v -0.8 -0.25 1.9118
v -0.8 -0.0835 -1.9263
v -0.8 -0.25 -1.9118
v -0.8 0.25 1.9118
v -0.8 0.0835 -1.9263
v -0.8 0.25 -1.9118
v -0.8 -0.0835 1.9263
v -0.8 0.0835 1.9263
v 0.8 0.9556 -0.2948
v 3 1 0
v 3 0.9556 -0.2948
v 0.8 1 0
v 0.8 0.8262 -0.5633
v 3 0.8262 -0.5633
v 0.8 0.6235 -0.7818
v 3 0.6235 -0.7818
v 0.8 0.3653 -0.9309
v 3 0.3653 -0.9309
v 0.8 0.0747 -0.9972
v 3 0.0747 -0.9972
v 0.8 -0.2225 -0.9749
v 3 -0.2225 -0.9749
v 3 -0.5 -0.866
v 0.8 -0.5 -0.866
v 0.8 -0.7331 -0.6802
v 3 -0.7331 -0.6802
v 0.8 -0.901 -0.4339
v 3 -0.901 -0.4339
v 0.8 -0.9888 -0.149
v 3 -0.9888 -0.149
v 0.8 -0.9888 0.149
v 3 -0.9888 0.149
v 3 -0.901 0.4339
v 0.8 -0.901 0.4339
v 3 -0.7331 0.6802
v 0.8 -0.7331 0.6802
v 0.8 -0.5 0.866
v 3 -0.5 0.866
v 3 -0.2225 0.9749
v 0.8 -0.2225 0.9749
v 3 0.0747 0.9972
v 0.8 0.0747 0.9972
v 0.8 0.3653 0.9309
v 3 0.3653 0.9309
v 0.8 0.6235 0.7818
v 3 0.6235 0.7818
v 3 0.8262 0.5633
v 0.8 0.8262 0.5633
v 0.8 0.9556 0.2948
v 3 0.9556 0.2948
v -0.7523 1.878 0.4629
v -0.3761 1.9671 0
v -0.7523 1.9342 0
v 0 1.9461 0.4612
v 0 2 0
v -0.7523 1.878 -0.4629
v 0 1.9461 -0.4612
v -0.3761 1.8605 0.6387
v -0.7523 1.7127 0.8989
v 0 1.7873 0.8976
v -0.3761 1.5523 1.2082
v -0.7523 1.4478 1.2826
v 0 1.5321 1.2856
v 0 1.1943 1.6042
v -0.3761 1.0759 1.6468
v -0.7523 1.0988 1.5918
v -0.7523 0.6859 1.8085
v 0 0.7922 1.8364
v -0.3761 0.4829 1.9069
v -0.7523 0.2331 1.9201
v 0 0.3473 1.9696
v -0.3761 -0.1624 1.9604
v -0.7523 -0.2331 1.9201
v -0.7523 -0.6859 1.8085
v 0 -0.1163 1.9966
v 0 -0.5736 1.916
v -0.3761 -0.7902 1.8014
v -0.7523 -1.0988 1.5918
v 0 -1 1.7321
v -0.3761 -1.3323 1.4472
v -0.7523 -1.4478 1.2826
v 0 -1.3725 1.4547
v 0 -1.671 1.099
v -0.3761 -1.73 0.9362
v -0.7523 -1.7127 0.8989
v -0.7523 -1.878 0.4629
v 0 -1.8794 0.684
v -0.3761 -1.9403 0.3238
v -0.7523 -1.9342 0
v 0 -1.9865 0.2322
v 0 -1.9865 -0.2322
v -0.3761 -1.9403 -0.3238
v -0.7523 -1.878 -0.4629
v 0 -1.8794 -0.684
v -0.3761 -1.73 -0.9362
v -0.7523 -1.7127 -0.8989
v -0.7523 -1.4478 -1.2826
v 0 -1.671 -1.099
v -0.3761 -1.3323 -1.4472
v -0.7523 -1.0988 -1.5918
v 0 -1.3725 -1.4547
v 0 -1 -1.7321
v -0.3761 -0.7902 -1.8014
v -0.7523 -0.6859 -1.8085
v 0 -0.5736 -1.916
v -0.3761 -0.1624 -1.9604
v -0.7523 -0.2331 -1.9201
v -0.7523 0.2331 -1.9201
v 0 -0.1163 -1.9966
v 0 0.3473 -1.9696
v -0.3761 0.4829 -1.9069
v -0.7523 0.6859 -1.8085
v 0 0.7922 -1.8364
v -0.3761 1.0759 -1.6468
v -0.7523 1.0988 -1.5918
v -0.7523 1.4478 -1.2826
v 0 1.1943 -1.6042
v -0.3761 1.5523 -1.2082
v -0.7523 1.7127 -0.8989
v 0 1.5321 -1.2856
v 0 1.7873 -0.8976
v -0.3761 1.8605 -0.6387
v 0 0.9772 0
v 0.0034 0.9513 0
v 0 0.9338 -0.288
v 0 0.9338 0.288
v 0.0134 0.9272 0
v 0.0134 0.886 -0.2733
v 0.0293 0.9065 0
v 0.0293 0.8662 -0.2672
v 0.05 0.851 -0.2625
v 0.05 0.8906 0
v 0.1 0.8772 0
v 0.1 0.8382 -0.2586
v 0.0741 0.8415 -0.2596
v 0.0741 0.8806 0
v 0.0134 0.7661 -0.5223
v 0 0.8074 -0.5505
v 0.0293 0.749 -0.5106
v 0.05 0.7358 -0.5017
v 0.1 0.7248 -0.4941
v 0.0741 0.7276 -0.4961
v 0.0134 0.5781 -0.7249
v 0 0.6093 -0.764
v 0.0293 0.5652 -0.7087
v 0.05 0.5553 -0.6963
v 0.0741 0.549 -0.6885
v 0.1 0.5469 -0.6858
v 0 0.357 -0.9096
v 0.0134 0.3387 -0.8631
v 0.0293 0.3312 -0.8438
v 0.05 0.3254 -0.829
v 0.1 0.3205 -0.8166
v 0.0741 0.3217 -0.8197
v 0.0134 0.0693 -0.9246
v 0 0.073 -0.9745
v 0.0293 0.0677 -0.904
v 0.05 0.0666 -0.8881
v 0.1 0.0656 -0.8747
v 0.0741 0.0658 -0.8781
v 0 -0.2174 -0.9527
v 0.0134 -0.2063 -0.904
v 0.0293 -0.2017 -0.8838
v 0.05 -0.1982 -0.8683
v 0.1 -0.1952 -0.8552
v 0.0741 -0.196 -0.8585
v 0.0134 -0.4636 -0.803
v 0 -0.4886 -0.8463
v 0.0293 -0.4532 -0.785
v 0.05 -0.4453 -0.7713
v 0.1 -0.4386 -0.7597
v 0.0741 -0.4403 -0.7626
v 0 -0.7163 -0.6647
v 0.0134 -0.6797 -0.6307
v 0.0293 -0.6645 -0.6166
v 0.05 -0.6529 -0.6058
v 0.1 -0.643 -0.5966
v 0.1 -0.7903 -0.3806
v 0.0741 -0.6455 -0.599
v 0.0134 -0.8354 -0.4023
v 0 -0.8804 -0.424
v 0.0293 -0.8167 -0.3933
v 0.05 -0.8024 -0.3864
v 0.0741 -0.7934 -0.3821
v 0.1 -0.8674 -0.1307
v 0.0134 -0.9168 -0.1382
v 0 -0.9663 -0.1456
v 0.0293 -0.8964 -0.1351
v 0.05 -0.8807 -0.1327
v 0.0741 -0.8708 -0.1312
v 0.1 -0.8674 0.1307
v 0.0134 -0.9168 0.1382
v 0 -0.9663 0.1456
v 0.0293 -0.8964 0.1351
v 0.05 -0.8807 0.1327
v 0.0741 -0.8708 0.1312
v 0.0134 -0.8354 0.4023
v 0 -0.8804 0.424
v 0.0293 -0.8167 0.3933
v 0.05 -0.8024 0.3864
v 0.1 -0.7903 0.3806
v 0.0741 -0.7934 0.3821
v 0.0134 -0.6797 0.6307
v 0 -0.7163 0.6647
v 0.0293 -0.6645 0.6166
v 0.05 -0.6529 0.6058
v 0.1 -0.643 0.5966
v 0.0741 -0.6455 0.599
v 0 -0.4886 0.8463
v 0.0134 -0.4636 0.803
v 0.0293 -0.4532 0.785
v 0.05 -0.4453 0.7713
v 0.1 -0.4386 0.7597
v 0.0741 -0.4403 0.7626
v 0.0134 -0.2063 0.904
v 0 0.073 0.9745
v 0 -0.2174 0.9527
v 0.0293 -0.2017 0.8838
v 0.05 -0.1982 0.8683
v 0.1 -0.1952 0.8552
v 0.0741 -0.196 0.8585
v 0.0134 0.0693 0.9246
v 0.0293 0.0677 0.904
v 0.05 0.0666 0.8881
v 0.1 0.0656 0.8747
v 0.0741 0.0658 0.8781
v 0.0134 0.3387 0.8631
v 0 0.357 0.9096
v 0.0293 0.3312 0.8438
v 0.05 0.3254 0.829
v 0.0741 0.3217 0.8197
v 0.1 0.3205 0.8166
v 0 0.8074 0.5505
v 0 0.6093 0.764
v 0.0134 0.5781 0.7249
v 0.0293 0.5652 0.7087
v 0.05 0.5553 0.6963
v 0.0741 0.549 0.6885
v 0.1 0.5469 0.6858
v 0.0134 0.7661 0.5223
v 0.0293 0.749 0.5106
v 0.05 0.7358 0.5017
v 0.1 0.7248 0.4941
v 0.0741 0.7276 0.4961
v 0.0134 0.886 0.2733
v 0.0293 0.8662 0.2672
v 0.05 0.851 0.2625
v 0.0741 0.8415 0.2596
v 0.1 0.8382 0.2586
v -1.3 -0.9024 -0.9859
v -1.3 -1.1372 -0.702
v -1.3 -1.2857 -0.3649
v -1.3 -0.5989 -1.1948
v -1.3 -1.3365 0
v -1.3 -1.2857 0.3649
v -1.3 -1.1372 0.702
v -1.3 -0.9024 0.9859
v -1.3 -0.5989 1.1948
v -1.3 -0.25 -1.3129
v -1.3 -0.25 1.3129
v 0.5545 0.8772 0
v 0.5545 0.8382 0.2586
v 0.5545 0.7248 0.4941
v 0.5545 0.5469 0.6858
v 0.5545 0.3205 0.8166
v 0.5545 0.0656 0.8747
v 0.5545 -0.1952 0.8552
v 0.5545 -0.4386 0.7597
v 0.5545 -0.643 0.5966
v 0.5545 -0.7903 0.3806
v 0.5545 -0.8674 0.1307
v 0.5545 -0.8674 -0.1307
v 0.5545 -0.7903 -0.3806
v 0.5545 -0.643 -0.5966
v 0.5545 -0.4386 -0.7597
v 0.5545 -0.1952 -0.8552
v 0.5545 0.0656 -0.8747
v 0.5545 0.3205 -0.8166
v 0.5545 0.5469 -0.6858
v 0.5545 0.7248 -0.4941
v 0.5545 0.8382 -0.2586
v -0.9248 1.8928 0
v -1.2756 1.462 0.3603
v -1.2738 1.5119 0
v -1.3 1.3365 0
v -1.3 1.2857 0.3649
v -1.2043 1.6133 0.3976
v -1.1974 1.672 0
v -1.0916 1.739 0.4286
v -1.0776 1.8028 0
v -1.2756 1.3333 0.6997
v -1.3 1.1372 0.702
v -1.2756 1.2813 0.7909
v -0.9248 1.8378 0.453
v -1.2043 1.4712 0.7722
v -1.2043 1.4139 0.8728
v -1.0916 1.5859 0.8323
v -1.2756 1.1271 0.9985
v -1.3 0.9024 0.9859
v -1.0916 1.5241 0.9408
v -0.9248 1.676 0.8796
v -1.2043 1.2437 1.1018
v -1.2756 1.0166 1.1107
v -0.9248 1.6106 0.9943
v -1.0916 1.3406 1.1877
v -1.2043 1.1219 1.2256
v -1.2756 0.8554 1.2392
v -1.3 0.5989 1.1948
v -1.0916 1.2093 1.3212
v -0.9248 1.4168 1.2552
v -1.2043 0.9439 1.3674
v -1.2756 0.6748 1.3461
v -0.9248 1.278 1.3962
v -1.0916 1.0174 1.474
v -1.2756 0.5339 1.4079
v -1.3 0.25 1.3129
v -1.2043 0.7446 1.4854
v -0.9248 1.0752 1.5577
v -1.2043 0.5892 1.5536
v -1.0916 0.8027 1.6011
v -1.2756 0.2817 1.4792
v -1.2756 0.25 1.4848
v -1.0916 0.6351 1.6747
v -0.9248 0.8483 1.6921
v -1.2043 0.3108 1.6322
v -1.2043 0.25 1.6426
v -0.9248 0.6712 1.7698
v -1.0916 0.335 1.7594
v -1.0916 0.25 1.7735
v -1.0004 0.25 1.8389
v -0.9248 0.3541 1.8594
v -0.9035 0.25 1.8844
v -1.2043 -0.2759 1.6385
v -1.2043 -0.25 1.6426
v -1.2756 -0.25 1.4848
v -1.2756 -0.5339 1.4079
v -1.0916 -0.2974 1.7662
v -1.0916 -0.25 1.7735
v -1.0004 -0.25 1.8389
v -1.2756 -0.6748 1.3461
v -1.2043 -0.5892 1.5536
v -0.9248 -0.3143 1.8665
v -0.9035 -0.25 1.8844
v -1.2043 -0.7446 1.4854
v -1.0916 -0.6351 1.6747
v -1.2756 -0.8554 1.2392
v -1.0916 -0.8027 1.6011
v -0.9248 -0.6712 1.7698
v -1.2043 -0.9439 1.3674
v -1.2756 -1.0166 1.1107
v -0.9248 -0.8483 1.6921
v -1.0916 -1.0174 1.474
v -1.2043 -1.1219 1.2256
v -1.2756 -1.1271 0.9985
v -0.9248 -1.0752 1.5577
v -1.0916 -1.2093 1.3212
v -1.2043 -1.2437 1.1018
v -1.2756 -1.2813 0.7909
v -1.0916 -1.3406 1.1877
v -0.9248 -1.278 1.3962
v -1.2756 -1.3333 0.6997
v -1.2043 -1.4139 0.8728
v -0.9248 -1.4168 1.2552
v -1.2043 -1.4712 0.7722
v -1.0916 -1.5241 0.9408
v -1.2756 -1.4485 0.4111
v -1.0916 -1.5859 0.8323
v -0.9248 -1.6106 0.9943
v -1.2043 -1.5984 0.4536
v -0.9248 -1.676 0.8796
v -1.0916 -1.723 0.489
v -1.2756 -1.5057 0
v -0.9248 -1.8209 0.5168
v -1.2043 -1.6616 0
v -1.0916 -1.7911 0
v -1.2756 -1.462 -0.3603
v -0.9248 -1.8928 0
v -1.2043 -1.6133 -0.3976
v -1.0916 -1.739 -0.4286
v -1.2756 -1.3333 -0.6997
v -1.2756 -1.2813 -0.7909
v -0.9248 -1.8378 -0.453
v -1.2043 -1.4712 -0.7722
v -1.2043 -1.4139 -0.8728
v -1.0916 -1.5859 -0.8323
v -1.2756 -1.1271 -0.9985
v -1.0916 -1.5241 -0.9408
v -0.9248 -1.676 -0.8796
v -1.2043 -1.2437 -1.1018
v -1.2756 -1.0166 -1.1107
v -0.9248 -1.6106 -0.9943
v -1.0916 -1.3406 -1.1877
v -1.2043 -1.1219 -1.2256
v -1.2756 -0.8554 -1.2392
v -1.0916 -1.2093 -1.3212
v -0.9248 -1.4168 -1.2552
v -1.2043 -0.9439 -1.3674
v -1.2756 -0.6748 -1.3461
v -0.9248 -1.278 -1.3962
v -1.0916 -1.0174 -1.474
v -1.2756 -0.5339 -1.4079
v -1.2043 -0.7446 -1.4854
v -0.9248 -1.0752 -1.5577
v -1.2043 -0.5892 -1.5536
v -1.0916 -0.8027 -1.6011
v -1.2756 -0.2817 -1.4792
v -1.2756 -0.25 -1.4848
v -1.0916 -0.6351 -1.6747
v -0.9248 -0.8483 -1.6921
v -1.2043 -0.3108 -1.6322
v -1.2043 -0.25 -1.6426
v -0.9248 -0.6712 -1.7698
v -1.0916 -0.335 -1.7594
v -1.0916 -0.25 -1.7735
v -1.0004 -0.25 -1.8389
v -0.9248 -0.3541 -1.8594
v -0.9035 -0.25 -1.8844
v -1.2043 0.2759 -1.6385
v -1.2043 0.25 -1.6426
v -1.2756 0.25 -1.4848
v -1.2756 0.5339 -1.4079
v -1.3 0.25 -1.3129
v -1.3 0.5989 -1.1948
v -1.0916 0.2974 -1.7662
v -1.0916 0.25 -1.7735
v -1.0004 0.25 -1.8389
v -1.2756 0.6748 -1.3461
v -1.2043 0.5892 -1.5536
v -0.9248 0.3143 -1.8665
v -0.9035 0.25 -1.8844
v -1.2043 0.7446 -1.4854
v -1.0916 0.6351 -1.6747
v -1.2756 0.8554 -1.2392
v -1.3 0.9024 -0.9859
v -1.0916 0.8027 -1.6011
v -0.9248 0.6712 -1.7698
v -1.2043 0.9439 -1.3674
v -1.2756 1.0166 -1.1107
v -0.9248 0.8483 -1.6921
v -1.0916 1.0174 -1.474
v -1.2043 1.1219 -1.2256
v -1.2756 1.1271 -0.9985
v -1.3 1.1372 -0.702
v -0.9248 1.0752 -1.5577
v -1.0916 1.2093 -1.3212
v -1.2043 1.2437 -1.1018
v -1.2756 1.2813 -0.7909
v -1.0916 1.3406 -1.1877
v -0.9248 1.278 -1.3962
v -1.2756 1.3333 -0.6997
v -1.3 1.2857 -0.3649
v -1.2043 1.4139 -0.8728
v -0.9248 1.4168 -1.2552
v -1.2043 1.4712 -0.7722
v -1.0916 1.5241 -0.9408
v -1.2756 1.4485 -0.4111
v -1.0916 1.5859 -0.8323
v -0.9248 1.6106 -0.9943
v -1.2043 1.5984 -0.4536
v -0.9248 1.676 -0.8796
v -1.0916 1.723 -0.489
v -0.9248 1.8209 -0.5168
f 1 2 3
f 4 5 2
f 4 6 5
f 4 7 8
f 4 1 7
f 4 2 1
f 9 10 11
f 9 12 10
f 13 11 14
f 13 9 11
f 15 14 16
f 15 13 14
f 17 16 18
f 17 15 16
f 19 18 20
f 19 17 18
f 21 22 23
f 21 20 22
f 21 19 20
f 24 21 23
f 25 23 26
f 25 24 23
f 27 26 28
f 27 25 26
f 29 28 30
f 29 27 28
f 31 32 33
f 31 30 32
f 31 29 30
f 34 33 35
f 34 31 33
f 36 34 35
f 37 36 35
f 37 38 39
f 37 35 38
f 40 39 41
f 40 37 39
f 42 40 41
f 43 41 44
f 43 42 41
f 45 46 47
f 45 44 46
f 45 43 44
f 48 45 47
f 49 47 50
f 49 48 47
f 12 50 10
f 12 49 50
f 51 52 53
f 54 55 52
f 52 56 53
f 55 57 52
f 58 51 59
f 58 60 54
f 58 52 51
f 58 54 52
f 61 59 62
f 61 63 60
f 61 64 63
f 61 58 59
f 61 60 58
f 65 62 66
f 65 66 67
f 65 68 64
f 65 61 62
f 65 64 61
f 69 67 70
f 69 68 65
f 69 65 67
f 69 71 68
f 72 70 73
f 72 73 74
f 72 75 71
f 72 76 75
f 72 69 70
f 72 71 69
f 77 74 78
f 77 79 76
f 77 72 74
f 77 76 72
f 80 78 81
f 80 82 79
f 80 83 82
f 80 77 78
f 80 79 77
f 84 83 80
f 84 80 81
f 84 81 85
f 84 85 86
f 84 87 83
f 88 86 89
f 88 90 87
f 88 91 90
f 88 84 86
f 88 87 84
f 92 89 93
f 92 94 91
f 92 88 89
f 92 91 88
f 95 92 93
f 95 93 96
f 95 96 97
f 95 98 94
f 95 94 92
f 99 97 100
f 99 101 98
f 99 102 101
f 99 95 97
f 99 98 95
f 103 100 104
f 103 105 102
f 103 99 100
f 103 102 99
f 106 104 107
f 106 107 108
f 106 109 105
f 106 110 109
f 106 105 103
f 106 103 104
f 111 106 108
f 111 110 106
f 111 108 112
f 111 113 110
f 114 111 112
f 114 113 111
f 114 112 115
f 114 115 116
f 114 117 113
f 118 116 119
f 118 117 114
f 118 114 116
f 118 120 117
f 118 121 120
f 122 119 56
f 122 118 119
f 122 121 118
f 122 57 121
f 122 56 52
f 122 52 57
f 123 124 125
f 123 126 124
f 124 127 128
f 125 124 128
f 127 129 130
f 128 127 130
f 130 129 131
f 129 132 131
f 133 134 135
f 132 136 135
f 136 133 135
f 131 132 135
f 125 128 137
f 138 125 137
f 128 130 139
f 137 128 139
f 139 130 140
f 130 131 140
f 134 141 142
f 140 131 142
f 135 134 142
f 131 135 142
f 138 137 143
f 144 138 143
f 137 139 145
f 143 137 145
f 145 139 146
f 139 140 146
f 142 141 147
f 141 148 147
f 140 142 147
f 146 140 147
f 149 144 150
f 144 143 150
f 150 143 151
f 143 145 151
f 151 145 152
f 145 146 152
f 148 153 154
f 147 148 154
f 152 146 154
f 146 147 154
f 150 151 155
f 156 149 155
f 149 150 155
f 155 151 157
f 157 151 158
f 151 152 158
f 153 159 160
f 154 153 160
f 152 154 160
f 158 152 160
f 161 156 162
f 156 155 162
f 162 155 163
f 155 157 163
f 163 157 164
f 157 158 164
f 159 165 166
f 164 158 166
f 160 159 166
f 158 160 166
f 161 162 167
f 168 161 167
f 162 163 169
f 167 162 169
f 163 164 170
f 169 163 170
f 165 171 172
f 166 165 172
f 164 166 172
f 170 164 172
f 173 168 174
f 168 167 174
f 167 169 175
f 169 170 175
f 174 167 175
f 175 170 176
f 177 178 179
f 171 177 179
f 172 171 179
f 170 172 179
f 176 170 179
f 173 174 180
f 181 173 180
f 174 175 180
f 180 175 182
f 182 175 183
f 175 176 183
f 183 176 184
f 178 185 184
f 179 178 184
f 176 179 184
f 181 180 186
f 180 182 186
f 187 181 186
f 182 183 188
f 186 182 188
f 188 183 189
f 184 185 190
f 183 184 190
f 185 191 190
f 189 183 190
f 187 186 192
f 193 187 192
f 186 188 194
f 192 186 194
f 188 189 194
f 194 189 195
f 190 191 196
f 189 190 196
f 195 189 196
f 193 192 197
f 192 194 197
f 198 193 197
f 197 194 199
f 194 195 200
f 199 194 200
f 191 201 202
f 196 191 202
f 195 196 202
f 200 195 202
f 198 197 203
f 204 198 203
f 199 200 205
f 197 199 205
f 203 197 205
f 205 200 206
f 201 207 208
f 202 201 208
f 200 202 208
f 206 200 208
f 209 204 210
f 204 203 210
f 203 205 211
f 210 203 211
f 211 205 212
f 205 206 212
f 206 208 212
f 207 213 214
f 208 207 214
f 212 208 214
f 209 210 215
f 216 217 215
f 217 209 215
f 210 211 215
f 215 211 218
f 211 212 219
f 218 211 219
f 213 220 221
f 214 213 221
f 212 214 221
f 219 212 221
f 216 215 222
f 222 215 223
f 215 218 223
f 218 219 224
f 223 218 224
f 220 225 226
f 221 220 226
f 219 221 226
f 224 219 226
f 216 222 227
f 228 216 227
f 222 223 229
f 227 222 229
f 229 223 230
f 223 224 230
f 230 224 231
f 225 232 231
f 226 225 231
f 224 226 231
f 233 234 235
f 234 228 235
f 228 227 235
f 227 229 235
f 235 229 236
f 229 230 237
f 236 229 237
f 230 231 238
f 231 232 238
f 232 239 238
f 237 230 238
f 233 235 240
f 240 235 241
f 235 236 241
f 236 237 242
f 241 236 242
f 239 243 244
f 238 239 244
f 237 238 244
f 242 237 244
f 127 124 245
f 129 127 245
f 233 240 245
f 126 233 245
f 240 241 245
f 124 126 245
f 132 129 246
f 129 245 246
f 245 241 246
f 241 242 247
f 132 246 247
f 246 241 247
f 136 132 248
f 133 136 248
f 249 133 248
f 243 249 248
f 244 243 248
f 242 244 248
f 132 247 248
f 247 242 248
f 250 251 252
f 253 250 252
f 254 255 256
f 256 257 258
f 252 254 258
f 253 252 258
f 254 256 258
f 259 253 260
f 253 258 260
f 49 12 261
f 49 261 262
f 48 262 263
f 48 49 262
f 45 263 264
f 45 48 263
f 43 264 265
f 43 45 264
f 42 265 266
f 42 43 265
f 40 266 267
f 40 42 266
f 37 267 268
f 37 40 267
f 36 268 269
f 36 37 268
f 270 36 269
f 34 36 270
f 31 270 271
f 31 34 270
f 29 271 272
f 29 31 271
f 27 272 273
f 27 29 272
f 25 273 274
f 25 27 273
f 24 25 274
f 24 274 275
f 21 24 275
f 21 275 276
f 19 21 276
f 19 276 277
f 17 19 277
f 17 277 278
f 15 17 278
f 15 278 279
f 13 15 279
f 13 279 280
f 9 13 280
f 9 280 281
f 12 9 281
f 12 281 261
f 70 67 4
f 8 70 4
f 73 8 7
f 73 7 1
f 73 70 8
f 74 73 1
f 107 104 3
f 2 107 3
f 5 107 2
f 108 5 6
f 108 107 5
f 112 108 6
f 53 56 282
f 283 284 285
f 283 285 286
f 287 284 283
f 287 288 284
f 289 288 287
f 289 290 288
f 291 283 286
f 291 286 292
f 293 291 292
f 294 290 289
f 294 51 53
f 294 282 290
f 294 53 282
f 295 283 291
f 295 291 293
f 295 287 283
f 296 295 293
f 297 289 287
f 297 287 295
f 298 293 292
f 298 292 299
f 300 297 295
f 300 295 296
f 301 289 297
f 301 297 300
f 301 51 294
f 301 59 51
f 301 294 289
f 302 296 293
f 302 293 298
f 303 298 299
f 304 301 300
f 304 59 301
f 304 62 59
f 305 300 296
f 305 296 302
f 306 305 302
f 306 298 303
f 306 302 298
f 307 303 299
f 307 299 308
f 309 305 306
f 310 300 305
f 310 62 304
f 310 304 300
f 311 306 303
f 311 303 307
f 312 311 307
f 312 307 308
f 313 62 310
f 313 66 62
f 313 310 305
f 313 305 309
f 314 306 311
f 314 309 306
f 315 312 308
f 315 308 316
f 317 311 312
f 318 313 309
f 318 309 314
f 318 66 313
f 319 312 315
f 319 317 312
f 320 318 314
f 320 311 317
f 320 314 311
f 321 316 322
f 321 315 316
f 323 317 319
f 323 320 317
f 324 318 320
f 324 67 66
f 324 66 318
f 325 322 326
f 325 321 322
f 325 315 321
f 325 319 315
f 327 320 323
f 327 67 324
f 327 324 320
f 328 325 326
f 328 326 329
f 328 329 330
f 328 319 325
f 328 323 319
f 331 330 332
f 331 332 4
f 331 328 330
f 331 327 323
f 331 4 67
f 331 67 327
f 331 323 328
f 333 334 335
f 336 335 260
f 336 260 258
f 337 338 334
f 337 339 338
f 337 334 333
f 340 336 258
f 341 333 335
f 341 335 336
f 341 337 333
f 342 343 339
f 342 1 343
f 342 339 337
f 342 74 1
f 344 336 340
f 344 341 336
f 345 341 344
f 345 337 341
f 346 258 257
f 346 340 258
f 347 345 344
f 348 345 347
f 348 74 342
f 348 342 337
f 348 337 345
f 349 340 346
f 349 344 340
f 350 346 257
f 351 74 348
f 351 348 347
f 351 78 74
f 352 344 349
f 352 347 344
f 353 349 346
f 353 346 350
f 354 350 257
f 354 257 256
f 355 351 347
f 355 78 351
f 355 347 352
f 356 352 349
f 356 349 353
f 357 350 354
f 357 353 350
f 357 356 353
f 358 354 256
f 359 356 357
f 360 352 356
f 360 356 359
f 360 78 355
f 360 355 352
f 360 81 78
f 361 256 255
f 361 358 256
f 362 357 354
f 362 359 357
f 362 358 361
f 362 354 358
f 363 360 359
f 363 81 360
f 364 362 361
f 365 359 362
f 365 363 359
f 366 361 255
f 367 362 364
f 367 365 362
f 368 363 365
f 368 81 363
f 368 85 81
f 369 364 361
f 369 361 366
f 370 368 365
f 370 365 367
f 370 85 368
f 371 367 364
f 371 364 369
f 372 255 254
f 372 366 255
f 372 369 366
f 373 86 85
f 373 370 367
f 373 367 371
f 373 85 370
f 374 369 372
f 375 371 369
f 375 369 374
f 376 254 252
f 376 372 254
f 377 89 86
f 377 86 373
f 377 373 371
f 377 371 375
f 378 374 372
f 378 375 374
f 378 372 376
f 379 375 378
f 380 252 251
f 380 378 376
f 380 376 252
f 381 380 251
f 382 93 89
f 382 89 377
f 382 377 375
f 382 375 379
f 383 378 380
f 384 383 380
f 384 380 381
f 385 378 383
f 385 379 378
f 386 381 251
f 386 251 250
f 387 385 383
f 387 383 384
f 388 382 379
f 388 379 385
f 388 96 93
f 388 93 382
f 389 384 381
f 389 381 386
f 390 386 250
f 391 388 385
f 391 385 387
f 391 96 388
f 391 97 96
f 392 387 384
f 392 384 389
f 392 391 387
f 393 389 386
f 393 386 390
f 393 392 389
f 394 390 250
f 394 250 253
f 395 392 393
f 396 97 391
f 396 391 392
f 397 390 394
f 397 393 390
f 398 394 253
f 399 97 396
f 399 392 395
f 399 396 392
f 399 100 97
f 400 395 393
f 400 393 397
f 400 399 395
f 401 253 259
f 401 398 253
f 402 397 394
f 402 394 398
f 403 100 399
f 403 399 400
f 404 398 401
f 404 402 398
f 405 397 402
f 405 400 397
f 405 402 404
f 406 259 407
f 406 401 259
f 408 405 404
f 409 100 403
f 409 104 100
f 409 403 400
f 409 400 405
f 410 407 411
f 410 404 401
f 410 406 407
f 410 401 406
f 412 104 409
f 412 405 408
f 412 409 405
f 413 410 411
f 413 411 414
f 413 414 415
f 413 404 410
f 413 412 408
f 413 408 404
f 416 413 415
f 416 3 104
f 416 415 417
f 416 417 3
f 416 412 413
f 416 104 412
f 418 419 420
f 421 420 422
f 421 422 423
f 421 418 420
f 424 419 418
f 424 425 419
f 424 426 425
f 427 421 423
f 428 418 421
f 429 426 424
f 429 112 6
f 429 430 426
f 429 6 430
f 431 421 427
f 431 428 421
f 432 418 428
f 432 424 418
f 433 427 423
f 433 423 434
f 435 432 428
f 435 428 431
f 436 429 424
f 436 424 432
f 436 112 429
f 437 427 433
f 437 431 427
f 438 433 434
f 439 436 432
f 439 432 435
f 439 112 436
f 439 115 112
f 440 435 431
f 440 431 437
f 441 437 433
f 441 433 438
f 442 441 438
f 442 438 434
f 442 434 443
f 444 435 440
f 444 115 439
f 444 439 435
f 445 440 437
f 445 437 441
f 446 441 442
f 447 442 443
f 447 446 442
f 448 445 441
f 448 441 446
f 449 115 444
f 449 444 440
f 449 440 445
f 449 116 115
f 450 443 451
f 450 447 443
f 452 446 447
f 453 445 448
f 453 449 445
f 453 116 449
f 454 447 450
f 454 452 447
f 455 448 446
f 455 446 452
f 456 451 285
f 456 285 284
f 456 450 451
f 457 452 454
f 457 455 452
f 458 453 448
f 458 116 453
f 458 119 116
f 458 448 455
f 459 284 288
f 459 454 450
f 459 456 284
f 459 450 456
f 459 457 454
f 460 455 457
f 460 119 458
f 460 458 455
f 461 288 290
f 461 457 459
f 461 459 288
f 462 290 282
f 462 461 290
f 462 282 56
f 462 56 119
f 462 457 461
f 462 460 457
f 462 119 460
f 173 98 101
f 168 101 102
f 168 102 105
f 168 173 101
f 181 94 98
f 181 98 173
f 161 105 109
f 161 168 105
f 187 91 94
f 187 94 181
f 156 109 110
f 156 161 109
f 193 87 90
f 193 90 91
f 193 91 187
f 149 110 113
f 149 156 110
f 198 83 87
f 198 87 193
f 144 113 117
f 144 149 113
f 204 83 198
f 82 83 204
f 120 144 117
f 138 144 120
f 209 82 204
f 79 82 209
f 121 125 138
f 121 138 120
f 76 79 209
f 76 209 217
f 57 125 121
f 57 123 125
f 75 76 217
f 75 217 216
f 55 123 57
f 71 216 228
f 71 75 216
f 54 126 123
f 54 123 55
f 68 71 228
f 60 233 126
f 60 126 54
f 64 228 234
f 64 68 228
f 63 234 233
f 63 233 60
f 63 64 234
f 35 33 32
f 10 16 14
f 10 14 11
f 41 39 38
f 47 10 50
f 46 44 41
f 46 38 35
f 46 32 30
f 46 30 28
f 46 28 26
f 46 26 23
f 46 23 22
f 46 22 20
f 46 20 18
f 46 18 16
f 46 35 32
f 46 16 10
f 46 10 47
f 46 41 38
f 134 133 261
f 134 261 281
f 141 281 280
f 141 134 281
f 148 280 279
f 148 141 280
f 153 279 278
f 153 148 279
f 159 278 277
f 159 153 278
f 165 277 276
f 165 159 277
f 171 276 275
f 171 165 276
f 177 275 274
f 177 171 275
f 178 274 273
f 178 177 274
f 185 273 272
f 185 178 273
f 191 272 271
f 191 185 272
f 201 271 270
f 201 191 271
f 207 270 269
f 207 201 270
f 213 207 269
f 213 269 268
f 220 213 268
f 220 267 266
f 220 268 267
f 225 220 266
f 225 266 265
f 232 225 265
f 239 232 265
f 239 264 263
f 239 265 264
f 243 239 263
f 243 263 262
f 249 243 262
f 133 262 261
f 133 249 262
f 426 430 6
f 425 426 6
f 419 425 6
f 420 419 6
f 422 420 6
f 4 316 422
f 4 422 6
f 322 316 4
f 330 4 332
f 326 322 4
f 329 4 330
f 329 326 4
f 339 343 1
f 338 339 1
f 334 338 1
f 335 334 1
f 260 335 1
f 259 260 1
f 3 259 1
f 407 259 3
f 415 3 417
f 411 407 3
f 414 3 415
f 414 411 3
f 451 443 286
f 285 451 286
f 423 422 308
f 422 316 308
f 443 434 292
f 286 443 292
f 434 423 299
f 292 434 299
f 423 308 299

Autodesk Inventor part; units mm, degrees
ref_plane "YZ Plane" through (0, 0, 0) normal (1, 0, 0) x (0, 1, 0)
ref_plane "XZ Plane" through (0, 0, 0) normal (0, 1, 0) x (-1, 0, 0)
sketch "Skizze1" plane through (0, 0, 0) normal (0, 0, 1) x (1, 0, 0)
  line L0 (-1.3, 0) -> (3, 0)
  line L1 (3, 0) -> (3, 1)
  line L2 (3, 1) -> (0.8, 1)
  line L3 (0.8, 1) -> (0.5545, 0.8772)
  line L4 (0.5545, 0.8772) -> (0, 0.8772)
  line L5 (0, 0.8772) -> (0, 2)
  line L6 (-2.16, 0) -> (3.86, 0) projected
  line L7 (0, -0.4) -> (0, 2.4) projected
  line L8 (-1.3, 0) -> (-1.3, 1.8863)
  line L9 (0, 2) -> (-1.3, 1.8863)
  line L10 (0.8, 1) -> (0, 1) construction
  dimension "d0" = 3
  dimension "d1" = 2.2
  dimension "d2" = 0.2455
  dimension "d3" = 1.3
  dimension "d4" = 2
  dimension "d5" = 1.7545
  dimension "d9" = 4
  dimension "d10" = 5
revolve "Körper" add sketch "Skizze1" angle 360 about axis through (-1.3, 0, 0) along (1, 0, 0)
sketch "Skizze2" plane through (-1.3, 0, 0) normal (-1, 0, 0) x (0, 0, 1)
  circle A0 centre (0, 0) radius 2 projected
  line L0 (0, 0) -> (0, 1.8863) projected
  line L1 (-2, 0.25) -> (2, 0.25)
  line L2 (2, 0.25) -> (2, -0.25)
  line L3 (2, -0.25) -> (-2, -0.25)
  line L4 (-2, -0.25) -> (-2, 0.25)
  line L5 (-2, 0) -> (2, 0) construction
  line L6 (0, 0.25) -> (0, -0.25) construction
  dimension "d11" = 0.5
  dimension "d12" = 4
fillet "Rundung1" radius 0.6 1 edges at (-1.3, -1.8863, 0)
extrude "Loch" cut sketch "Skizze2" against normal blind 0.5 contours A0 L3 L1 | L2 L3 A0 | A0 L1 L2 | A0 L4 L1 | L3 L4 A0
thread "Gewinde" size "M2x0.4" class "6g" standard "ISO Metric profile" length 2.2
ref_plane "Work Plane1" through (30.1625, 0, 0) normal (0, 0, -1) x (1, 0, 0)
fillet "Fillet5" radius 0.1 1 edges at (0, -0.8772, 0)
equation "\"d11\" = SBR"
equation "\"d12\" = KOD"
equation "\"d14\" = RR"
equation "\"d19\" = STI"
equation "\"d15\" = GEL"
equation "\"d41\" = R"
equation "\"d0\" = NLG"
equation "\"d1\" = GEL"
equation "\"d3\" = KOH"
equation "\"d4\" = GD"
equation "\"d5\" = BDM"
equation "\"d9\" = KOD"
equation "\"d10\" = KEWI"
equation "\"GD\" = NND"
equation "\"NLG\" = 3"
equation "\"GEL\" = 2.2"
equation "\"KOD\" = 4"
equation "\"KOH\" = 1.3"
equation "\"GAL\" = 0.61345 * PTC"
equation "\"R\" = 0.1"
equation "\"BDM\" = 1.7545"
equation "\"GUL\" = 0.61345 * PTC"
equation "\"RR\" = 0.6"
equation "\"SBR\" = 0.5"
equation "\"STI\" = 0.5"
equation "\"KEWI\" = 5deg"
equation "\"PTC\" = 0.4"
equation "\"THREADDIA\" = 2"
equation "\"TOA\" = 30deg"
equation "\"NND\" = 2"
equation "\"GD1\" = THREADDIA - 1.2269 * PTC"
properties part number "ISO 1580 - M2 x 3" material "Stahl, weich"
